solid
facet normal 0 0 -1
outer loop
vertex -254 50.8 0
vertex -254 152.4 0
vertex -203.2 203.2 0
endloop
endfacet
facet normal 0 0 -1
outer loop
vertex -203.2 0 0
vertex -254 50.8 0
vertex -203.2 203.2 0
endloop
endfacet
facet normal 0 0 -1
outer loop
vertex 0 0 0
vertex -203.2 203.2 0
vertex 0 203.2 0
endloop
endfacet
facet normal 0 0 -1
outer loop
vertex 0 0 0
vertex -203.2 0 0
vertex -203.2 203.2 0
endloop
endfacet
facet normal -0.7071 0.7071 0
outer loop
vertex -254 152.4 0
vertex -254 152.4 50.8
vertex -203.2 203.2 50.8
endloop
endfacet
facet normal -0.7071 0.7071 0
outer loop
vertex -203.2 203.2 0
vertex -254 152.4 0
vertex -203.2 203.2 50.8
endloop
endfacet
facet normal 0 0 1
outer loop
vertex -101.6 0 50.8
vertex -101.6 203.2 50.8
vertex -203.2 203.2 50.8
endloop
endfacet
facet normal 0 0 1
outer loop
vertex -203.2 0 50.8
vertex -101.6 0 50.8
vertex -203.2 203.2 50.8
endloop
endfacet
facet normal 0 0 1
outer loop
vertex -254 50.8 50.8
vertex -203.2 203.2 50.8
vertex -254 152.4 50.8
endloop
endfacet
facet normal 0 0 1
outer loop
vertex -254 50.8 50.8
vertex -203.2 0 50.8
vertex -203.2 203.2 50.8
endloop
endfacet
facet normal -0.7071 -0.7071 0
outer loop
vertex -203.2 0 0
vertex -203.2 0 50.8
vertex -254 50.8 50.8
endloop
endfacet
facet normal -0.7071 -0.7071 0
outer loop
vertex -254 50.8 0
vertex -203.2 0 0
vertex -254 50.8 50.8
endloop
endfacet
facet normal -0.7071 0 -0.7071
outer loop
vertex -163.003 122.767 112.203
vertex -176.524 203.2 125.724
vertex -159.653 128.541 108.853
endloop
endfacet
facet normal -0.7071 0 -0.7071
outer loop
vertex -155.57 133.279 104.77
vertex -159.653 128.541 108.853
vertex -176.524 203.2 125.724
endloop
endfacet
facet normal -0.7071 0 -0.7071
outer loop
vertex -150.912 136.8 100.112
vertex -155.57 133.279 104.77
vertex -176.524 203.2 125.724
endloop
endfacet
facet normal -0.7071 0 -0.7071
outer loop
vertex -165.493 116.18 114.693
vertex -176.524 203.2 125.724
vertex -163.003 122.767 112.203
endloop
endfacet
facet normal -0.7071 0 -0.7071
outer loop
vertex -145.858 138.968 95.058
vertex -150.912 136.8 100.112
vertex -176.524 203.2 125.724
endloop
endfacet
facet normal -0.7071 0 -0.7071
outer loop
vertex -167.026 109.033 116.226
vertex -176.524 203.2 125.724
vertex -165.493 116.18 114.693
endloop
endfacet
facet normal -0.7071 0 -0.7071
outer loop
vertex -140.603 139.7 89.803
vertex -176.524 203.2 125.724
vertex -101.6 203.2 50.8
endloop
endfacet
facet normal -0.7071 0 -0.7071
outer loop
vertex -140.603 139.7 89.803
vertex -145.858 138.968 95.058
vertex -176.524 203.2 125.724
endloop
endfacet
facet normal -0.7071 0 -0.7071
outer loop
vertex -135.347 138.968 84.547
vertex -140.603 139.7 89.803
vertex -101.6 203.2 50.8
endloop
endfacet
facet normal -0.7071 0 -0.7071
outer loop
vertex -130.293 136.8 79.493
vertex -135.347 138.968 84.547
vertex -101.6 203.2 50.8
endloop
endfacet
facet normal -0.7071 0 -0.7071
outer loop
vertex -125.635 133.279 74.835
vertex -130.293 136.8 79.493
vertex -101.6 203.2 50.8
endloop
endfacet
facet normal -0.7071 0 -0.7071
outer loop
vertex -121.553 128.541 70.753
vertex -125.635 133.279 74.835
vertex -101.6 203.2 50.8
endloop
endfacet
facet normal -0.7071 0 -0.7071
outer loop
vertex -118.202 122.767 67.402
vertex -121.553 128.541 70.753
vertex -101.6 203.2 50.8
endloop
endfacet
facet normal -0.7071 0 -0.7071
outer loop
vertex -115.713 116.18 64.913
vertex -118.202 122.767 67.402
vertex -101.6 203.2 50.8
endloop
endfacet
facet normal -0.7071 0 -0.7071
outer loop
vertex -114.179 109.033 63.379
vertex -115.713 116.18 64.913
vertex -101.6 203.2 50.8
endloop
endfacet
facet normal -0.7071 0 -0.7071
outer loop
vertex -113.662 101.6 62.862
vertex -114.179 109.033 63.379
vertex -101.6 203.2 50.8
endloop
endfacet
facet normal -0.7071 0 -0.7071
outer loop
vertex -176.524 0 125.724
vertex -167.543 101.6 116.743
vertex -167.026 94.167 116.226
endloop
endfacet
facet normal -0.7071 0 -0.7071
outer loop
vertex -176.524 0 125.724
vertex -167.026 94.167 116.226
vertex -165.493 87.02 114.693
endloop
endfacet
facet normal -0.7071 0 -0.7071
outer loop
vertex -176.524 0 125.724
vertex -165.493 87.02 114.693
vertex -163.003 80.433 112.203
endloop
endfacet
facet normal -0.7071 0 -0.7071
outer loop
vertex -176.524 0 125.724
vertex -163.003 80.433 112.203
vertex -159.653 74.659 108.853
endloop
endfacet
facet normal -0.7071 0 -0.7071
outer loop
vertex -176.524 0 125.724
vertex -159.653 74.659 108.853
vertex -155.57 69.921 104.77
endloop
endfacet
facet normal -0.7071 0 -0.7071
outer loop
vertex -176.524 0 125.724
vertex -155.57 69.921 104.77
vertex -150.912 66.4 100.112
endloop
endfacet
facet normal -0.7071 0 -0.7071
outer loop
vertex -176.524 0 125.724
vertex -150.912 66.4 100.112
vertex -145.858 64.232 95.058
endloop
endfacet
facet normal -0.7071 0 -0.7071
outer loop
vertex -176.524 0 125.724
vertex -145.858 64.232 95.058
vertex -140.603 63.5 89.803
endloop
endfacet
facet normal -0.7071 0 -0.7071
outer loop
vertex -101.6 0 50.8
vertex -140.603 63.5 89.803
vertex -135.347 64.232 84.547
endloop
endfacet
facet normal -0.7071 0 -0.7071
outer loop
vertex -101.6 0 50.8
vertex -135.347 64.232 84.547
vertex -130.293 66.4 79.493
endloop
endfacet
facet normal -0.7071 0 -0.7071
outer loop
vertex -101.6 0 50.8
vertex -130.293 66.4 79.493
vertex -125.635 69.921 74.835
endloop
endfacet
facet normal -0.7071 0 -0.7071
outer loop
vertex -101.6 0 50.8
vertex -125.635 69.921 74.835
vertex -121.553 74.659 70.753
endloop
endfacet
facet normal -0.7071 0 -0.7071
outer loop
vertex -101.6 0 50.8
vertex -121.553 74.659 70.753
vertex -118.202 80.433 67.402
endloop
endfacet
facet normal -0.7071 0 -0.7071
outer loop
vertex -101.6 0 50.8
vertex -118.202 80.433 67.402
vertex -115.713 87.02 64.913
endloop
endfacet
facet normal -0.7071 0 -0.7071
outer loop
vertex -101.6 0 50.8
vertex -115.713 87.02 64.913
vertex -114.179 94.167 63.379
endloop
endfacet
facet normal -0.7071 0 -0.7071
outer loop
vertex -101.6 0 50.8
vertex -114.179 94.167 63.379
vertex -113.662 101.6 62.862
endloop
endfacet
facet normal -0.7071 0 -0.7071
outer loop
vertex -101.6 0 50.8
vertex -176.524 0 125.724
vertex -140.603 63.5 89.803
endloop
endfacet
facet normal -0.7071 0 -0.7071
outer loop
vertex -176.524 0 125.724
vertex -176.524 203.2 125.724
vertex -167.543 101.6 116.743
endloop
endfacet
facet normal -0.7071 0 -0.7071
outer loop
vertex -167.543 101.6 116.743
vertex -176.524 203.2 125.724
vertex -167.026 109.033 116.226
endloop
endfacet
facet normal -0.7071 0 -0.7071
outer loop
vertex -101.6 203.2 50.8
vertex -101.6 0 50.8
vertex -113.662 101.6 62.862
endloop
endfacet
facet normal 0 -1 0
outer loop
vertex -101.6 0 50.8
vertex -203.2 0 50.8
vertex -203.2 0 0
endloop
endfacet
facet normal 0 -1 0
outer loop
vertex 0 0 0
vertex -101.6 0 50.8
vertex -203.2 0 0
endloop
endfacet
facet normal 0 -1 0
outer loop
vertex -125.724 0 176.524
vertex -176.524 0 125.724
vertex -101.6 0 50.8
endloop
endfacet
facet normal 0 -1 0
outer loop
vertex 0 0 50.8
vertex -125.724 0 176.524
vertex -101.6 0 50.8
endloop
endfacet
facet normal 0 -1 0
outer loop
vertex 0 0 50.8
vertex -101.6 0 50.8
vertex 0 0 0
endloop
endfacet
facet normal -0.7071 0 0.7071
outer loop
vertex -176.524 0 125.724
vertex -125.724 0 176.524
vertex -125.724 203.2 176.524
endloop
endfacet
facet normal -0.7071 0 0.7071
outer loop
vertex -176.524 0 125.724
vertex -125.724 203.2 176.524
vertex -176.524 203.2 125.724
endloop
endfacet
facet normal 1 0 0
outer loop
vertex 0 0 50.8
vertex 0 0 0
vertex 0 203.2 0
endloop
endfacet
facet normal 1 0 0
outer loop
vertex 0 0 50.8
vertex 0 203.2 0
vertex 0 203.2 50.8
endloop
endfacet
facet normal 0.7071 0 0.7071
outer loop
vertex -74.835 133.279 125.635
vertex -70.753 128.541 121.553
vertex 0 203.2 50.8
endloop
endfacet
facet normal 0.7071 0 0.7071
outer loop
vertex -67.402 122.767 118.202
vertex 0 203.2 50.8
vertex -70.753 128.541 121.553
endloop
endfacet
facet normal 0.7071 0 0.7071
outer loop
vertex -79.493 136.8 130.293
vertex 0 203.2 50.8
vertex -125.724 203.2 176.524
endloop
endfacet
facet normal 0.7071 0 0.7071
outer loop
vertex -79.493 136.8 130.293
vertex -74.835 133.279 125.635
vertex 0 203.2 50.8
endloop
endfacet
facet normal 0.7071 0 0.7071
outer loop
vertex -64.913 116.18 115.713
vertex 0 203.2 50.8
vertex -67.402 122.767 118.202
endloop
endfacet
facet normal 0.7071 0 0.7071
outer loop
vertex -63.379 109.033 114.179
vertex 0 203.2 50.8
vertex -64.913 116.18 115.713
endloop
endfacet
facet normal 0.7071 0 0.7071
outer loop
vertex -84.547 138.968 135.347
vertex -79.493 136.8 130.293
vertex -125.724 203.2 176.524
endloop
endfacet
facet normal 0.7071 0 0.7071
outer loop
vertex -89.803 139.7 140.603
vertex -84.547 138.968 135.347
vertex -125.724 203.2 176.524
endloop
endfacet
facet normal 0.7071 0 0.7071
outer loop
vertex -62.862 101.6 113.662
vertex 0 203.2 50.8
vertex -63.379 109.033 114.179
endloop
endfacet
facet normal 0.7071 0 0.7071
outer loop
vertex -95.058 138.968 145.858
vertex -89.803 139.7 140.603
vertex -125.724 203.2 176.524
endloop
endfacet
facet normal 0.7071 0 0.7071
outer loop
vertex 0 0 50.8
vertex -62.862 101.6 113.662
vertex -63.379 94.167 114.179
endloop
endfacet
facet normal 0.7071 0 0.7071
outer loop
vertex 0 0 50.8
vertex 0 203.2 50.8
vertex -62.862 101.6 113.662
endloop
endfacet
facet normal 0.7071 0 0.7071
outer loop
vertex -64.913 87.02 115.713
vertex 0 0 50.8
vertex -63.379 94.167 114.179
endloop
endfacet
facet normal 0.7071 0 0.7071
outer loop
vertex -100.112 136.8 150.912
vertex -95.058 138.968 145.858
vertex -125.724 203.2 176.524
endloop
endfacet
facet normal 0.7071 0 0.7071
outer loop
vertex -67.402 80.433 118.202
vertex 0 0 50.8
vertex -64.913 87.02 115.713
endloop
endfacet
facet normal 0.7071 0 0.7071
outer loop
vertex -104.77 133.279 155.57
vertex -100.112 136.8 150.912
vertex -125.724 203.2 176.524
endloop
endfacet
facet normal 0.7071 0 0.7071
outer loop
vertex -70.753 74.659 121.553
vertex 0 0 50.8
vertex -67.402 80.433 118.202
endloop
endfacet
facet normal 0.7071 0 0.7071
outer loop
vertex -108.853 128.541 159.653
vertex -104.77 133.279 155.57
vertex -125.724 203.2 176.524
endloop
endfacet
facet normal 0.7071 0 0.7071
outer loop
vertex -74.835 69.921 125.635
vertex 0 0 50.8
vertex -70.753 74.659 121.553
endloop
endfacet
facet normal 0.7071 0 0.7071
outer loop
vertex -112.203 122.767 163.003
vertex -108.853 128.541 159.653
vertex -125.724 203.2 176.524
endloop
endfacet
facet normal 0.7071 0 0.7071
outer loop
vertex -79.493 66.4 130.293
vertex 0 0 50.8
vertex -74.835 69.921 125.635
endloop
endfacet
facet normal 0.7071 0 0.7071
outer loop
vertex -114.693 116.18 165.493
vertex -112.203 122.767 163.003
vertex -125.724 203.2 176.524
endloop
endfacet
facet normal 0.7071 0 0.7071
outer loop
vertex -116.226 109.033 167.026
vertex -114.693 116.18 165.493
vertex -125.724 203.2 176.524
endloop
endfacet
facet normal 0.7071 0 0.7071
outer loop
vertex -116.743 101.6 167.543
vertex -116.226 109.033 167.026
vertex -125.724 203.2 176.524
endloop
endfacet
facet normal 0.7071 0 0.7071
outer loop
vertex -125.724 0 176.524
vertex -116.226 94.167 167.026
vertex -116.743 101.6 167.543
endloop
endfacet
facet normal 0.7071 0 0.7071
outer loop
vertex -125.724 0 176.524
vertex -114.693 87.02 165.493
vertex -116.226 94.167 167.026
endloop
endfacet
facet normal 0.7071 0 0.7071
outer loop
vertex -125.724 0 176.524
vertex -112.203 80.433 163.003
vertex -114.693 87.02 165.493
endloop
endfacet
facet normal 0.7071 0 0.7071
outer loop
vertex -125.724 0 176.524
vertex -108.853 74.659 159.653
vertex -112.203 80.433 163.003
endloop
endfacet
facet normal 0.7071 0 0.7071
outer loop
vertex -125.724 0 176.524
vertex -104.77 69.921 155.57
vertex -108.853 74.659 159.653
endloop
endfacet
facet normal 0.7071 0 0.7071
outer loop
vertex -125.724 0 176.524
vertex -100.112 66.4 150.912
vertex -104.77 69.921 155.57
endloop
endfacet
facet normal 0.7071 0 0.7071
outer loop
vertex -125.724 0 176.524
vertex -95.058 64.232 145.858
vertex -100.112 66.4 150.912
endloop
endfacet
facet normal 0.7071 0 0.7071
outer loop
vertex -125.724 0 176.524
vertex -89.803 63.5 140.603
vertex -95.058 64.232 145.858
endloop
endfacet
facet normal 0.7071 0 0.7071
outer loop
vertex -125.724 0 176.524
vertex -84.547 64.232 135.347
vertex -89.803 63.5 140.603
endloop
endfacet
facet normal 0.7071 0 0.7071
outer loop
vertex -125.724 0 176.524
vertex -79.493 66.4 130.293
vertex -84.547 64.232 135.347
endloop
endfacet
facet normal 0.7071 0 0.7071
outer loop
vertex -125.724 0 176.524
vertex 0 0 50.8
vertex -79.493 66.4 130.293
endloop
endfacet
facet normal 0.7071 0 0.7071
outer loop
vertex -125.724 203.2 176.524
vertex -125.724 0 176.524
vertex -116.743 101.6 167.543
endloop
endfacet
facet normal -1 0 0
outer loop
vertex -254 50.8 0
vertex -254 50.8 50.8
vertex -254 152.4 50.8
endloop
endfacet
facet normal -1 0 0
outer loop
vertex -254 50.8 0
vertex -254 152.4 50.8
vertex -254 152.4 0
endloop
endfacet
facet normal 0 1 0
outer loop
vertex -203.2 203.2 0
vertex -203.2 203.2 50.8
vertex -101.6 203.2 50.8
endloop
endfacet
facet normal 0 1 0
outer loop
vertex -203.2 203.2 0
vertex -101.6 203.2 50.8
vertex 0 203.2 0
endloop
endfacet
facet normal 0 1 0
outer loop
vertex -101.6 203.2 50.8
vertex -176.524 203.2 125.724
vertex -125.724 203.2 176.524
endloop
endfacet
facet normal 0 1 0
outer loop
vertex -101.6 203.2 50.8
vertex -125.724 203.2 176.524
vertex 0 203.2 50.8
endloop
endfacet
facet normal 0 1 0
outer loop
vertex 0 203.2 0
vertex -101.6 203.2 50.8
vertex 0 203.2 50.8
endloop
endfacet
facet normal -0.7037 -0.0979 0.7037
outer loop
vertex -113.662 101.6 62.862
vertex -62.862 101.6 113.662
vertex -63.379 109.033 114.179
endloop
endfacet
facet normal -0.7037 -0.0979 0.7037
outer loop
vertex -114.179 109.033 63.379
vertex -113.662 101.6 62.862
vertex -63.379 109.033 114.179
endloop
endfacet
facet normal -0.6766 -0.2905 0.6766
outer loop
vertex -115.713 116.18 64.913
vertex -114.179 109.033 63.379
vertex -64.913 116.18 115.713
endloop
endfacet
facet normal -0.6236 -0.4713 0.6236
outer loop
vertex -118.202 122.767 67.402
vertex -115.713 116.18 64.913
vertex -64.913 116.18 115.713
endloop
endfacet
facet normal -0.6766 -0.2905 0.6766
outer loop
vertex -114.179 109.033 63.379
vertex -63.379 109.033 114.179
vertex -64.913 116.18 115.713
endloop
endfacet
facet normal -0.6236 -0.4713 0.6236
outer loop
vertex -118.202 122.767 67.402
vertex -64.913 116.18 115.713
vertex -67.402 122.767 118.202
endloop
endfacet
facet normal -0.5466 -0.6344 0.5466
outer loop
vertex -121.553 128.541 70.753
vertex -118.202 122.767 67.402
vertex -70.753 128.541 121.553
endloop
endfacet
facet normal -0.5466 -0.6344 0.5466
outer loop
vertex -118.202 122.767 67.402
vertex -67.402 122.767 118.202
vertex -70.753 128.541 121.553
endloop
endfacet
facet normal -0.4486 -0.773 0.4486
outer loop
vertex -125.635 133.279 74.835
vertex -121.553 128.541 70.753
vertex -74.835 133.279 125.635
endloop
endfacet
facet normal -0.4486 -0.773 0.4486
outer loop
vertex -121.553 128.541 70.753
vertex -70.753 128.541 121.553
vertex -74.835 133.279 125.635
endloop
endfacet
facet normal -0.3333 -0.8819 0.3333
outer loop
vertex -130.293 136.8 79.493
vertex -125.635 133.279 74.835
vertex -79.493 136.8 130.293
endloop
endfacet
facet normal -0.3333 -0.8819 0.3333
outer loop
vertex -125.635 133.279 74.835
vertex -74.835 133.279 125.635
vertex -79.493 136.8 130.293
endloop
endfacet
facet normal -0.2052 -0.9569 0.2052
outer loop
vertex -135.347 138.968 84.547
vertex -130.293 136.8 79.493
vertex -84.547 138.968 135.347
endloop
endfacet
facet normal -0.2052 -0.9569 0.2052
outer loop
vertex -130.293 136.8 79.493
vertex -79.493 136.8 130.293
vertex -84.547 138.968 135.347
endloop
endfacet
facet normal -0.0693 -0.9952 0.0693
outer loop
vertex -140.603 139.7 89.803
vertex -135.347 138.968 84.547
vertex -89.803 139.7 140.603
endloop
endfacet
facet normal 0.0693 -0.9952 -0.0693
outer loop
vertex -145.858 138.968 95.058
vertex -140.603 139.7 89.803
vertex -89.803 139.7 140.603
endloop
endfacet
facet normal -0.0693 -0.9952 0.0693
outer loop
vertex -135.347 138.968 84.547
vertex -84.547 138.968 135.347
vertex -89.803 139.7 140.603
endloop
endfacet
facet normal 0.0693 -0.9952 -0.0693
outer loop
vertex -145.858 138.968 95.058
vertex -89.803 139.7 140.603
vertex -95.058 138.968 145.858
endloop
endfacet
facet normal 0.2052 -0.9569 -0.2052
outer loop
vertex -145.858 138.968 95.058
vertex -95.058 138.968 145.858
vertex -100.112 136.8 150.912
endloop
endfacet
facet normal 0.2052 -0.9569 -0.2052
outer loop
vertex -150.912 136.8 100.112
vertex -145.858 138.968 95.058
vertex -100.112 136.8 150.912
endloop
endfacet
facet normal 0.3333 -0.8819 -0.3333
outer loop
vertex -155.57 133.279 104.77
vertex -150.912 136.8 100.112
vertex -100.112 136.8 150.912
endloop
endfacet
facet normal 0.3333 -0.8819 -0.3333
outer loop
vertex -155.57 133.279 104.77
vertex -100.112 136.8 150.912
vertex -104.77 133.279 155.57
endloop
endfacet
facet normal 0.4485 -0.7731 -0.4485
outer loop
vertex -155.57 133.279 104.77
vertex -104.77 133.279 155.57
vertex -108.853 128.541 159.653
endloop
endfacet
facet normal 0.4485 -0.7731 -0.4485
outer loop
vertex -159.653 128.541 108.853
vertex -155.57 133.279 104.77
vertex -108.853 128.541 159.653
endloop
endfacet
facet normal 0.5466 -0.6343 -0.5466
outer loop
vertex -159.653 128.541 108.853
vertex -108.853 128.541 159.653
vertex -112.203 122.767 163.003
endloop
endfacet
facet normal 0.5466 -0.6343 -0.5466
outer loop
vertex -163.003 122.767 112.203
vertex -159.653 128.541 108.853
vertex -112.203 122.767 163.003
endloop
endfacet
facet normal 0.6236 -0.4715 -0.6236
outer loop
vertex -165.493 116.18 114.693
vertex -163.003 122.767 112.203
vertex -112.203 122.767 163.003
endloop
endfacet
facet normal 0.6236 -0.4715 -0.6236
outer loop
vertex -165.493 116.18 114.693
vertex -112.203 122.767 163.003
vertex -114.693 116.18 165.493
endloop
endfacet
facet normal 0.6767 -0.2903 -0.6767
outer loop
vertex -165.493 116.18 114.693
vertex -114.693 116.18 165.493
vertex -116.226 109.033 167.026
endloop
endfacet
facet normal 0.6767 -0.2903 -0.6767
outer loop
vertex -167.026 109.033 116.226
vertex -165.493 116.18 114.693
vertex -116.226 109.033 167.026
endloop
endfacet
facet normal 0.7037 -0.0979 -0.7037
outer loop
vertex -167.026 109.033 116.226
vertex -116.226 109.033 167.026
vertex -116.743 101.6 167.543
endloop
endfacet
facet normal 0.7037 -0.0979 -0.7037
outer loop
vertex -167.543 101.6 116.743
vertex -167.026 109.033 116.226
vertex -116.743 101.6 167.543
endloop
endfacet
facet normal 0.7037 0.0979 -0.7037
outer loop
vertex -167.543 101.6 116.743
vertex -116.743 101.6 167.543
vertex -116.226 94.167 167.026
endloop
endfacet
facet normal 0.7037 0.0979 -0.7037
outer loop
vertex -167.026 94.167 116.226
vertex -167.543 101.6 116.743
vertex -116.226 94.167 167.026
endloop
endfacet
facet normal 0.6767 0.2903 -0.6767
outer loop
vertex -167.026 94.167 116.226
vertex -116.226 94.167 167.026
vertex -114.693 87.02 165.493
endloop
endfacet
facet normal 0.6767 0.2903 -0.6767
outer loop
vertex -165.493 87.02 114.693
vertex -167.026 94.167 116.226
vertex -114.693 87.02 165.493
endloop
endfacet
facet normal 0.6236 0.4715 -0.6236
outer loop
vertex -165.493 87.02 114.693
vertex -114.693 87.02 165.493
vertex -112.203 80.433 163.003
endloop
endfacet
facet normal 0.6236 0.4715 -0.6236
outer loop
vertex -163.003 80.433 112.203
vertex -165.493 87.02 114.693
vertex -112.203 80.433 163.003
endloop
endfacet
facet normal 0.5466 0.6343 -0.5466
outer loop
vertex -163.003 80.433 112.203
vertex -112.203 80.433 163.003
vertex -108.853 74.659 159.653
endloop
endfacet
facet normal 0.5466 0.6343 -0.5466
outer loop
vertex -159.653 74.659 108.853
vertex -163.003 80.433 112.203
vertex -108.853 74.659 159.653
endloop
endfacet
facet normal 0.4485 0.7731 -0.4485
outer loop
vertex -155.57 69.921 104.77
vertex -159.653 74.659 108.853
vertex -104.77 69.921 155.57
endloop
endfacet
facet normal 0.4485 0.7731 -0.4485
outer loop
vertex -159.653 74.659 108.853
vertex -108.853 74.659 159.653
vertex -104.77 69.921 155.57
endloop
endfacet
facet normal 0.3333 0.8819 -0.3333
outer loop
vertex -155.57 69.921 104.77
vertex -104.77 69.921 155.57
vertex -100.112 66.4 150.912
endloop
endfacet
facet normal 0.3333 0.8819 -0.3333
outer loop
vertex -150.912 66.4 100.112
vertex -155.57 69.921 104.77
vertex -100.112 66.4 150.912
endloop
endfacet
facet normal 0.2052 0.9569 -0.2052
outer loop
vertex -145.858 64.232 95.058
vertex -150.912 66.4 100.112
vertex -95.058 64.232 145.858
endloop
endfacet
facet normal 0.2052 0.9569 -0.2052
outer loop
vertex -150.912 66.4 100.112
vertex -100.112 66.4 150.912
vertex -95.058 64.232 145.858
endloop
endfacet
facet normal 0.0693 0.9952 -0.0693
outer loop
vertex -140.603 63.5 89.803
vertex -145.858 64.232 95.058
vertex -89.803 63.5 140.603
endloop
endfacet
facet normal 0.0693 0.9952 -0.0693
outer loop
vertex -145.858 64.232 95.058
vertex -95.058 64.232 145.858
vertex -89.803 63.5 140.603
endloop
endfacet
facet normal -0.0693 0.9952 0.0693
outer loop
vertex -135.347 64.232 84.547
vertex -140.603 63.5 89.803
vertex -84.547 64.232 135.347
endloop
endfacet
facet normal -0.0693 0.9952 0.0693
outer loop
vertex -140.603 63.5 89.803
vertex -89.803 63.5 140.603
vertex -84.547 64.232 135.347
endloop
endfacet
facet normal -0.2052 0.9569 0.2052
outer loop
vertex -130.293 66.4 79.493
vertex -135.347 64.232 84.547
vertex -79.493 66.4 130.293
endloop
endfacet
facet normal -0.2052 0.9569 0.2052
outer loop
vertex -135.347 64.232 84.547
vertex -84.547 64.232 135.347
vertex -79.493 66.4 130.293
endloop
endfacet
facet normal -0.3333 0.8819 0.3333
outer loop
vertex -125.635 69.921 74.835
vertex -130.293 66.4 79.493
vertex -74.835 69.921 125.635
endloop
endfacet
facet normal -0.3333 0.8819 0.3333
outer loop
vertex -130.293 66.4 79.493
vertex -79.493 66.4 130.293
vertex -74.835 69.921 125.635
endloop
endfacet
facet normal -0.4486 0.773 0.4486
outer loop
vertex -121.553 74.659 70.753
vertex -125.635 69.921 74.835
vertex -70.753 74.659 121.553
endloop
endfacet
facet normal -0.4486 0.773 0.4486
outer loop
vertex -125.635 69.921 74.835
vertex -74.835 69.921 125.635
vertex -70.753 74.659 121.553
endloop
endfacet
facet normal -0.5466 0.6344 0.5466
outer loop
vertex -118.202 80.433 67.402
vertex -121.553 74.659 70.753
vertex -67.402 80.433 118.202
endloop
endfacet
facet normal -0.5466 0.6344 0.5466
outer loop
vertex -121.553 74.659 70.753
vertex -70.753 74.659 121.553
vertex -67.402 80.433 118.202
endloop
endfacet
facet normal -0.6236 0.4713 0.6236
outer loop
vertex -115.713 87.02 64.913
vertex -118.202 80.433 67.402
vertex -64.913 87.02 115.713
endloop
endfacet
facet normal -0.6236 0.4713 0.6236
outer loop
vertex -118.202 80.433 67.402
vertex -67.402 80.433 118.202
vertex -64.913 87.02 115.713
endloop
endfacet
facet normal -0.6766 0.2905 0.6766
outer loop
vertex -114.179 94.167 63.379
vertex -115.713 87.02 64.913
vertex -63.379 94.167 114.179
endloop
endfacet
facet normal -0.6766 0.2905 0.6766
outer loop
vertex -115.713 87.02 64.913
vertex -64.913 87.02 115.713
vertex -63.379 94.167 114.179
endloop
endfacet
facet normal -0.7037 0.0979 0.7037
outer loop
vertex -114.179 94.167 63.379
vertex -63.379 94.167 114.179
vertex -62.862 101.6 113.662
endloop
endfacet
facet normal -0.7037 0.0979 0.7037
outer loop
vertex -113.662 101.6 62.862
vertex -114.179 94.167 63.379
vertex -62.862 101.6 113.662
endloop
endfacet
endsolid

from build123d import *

# Parameters (mm, degrees)
F1_DEPTH = 203.2
F2_R     = 38.1
F3_DEPTH = 76.2
F5_DEPTH = 50.8


with BuildPart() as f1:
    # F0 (on Front) → F1 (new body)
    with BuildSketch(Plane.XZ):
        Polygon((-254, 0), (0, 0), (0, 50.8), (-125.723586, 176.523586), (-176.523586, 125.723586), (-101.6, 50.8), (-254, 50.8), align=None)
    extrude(amount=-F1_DEPTH)

    # F2 (on face) → F3 (cut)
    with BuildSketch(Plane(origin=(25.4, 0, 25.4), x_dir=(0.707107, 0, -0.707107), z_dir=(0.707107, 0, 0.707107))):
        with Locations((-162.921024, 101.6)):
            Circle(F2_R)
    extrude(amount=-F3_DEPTH, mode=Mode.SUBTRACT)

    # F4 (on face) → F5 (cut)
    with BuildSketch(Plane.XY.offset(50.8)):
        Polygon((-254, 203.2), (-254, 152.4), (-203.2, 203.2), align=None)
        Polygon((-254, 50.8), (-254, 0), (-203.2, 0), align=None)
    extrude(amount=-F5_DEPTH, mode=Mode.SUBTRACT)


solid = f1.part
